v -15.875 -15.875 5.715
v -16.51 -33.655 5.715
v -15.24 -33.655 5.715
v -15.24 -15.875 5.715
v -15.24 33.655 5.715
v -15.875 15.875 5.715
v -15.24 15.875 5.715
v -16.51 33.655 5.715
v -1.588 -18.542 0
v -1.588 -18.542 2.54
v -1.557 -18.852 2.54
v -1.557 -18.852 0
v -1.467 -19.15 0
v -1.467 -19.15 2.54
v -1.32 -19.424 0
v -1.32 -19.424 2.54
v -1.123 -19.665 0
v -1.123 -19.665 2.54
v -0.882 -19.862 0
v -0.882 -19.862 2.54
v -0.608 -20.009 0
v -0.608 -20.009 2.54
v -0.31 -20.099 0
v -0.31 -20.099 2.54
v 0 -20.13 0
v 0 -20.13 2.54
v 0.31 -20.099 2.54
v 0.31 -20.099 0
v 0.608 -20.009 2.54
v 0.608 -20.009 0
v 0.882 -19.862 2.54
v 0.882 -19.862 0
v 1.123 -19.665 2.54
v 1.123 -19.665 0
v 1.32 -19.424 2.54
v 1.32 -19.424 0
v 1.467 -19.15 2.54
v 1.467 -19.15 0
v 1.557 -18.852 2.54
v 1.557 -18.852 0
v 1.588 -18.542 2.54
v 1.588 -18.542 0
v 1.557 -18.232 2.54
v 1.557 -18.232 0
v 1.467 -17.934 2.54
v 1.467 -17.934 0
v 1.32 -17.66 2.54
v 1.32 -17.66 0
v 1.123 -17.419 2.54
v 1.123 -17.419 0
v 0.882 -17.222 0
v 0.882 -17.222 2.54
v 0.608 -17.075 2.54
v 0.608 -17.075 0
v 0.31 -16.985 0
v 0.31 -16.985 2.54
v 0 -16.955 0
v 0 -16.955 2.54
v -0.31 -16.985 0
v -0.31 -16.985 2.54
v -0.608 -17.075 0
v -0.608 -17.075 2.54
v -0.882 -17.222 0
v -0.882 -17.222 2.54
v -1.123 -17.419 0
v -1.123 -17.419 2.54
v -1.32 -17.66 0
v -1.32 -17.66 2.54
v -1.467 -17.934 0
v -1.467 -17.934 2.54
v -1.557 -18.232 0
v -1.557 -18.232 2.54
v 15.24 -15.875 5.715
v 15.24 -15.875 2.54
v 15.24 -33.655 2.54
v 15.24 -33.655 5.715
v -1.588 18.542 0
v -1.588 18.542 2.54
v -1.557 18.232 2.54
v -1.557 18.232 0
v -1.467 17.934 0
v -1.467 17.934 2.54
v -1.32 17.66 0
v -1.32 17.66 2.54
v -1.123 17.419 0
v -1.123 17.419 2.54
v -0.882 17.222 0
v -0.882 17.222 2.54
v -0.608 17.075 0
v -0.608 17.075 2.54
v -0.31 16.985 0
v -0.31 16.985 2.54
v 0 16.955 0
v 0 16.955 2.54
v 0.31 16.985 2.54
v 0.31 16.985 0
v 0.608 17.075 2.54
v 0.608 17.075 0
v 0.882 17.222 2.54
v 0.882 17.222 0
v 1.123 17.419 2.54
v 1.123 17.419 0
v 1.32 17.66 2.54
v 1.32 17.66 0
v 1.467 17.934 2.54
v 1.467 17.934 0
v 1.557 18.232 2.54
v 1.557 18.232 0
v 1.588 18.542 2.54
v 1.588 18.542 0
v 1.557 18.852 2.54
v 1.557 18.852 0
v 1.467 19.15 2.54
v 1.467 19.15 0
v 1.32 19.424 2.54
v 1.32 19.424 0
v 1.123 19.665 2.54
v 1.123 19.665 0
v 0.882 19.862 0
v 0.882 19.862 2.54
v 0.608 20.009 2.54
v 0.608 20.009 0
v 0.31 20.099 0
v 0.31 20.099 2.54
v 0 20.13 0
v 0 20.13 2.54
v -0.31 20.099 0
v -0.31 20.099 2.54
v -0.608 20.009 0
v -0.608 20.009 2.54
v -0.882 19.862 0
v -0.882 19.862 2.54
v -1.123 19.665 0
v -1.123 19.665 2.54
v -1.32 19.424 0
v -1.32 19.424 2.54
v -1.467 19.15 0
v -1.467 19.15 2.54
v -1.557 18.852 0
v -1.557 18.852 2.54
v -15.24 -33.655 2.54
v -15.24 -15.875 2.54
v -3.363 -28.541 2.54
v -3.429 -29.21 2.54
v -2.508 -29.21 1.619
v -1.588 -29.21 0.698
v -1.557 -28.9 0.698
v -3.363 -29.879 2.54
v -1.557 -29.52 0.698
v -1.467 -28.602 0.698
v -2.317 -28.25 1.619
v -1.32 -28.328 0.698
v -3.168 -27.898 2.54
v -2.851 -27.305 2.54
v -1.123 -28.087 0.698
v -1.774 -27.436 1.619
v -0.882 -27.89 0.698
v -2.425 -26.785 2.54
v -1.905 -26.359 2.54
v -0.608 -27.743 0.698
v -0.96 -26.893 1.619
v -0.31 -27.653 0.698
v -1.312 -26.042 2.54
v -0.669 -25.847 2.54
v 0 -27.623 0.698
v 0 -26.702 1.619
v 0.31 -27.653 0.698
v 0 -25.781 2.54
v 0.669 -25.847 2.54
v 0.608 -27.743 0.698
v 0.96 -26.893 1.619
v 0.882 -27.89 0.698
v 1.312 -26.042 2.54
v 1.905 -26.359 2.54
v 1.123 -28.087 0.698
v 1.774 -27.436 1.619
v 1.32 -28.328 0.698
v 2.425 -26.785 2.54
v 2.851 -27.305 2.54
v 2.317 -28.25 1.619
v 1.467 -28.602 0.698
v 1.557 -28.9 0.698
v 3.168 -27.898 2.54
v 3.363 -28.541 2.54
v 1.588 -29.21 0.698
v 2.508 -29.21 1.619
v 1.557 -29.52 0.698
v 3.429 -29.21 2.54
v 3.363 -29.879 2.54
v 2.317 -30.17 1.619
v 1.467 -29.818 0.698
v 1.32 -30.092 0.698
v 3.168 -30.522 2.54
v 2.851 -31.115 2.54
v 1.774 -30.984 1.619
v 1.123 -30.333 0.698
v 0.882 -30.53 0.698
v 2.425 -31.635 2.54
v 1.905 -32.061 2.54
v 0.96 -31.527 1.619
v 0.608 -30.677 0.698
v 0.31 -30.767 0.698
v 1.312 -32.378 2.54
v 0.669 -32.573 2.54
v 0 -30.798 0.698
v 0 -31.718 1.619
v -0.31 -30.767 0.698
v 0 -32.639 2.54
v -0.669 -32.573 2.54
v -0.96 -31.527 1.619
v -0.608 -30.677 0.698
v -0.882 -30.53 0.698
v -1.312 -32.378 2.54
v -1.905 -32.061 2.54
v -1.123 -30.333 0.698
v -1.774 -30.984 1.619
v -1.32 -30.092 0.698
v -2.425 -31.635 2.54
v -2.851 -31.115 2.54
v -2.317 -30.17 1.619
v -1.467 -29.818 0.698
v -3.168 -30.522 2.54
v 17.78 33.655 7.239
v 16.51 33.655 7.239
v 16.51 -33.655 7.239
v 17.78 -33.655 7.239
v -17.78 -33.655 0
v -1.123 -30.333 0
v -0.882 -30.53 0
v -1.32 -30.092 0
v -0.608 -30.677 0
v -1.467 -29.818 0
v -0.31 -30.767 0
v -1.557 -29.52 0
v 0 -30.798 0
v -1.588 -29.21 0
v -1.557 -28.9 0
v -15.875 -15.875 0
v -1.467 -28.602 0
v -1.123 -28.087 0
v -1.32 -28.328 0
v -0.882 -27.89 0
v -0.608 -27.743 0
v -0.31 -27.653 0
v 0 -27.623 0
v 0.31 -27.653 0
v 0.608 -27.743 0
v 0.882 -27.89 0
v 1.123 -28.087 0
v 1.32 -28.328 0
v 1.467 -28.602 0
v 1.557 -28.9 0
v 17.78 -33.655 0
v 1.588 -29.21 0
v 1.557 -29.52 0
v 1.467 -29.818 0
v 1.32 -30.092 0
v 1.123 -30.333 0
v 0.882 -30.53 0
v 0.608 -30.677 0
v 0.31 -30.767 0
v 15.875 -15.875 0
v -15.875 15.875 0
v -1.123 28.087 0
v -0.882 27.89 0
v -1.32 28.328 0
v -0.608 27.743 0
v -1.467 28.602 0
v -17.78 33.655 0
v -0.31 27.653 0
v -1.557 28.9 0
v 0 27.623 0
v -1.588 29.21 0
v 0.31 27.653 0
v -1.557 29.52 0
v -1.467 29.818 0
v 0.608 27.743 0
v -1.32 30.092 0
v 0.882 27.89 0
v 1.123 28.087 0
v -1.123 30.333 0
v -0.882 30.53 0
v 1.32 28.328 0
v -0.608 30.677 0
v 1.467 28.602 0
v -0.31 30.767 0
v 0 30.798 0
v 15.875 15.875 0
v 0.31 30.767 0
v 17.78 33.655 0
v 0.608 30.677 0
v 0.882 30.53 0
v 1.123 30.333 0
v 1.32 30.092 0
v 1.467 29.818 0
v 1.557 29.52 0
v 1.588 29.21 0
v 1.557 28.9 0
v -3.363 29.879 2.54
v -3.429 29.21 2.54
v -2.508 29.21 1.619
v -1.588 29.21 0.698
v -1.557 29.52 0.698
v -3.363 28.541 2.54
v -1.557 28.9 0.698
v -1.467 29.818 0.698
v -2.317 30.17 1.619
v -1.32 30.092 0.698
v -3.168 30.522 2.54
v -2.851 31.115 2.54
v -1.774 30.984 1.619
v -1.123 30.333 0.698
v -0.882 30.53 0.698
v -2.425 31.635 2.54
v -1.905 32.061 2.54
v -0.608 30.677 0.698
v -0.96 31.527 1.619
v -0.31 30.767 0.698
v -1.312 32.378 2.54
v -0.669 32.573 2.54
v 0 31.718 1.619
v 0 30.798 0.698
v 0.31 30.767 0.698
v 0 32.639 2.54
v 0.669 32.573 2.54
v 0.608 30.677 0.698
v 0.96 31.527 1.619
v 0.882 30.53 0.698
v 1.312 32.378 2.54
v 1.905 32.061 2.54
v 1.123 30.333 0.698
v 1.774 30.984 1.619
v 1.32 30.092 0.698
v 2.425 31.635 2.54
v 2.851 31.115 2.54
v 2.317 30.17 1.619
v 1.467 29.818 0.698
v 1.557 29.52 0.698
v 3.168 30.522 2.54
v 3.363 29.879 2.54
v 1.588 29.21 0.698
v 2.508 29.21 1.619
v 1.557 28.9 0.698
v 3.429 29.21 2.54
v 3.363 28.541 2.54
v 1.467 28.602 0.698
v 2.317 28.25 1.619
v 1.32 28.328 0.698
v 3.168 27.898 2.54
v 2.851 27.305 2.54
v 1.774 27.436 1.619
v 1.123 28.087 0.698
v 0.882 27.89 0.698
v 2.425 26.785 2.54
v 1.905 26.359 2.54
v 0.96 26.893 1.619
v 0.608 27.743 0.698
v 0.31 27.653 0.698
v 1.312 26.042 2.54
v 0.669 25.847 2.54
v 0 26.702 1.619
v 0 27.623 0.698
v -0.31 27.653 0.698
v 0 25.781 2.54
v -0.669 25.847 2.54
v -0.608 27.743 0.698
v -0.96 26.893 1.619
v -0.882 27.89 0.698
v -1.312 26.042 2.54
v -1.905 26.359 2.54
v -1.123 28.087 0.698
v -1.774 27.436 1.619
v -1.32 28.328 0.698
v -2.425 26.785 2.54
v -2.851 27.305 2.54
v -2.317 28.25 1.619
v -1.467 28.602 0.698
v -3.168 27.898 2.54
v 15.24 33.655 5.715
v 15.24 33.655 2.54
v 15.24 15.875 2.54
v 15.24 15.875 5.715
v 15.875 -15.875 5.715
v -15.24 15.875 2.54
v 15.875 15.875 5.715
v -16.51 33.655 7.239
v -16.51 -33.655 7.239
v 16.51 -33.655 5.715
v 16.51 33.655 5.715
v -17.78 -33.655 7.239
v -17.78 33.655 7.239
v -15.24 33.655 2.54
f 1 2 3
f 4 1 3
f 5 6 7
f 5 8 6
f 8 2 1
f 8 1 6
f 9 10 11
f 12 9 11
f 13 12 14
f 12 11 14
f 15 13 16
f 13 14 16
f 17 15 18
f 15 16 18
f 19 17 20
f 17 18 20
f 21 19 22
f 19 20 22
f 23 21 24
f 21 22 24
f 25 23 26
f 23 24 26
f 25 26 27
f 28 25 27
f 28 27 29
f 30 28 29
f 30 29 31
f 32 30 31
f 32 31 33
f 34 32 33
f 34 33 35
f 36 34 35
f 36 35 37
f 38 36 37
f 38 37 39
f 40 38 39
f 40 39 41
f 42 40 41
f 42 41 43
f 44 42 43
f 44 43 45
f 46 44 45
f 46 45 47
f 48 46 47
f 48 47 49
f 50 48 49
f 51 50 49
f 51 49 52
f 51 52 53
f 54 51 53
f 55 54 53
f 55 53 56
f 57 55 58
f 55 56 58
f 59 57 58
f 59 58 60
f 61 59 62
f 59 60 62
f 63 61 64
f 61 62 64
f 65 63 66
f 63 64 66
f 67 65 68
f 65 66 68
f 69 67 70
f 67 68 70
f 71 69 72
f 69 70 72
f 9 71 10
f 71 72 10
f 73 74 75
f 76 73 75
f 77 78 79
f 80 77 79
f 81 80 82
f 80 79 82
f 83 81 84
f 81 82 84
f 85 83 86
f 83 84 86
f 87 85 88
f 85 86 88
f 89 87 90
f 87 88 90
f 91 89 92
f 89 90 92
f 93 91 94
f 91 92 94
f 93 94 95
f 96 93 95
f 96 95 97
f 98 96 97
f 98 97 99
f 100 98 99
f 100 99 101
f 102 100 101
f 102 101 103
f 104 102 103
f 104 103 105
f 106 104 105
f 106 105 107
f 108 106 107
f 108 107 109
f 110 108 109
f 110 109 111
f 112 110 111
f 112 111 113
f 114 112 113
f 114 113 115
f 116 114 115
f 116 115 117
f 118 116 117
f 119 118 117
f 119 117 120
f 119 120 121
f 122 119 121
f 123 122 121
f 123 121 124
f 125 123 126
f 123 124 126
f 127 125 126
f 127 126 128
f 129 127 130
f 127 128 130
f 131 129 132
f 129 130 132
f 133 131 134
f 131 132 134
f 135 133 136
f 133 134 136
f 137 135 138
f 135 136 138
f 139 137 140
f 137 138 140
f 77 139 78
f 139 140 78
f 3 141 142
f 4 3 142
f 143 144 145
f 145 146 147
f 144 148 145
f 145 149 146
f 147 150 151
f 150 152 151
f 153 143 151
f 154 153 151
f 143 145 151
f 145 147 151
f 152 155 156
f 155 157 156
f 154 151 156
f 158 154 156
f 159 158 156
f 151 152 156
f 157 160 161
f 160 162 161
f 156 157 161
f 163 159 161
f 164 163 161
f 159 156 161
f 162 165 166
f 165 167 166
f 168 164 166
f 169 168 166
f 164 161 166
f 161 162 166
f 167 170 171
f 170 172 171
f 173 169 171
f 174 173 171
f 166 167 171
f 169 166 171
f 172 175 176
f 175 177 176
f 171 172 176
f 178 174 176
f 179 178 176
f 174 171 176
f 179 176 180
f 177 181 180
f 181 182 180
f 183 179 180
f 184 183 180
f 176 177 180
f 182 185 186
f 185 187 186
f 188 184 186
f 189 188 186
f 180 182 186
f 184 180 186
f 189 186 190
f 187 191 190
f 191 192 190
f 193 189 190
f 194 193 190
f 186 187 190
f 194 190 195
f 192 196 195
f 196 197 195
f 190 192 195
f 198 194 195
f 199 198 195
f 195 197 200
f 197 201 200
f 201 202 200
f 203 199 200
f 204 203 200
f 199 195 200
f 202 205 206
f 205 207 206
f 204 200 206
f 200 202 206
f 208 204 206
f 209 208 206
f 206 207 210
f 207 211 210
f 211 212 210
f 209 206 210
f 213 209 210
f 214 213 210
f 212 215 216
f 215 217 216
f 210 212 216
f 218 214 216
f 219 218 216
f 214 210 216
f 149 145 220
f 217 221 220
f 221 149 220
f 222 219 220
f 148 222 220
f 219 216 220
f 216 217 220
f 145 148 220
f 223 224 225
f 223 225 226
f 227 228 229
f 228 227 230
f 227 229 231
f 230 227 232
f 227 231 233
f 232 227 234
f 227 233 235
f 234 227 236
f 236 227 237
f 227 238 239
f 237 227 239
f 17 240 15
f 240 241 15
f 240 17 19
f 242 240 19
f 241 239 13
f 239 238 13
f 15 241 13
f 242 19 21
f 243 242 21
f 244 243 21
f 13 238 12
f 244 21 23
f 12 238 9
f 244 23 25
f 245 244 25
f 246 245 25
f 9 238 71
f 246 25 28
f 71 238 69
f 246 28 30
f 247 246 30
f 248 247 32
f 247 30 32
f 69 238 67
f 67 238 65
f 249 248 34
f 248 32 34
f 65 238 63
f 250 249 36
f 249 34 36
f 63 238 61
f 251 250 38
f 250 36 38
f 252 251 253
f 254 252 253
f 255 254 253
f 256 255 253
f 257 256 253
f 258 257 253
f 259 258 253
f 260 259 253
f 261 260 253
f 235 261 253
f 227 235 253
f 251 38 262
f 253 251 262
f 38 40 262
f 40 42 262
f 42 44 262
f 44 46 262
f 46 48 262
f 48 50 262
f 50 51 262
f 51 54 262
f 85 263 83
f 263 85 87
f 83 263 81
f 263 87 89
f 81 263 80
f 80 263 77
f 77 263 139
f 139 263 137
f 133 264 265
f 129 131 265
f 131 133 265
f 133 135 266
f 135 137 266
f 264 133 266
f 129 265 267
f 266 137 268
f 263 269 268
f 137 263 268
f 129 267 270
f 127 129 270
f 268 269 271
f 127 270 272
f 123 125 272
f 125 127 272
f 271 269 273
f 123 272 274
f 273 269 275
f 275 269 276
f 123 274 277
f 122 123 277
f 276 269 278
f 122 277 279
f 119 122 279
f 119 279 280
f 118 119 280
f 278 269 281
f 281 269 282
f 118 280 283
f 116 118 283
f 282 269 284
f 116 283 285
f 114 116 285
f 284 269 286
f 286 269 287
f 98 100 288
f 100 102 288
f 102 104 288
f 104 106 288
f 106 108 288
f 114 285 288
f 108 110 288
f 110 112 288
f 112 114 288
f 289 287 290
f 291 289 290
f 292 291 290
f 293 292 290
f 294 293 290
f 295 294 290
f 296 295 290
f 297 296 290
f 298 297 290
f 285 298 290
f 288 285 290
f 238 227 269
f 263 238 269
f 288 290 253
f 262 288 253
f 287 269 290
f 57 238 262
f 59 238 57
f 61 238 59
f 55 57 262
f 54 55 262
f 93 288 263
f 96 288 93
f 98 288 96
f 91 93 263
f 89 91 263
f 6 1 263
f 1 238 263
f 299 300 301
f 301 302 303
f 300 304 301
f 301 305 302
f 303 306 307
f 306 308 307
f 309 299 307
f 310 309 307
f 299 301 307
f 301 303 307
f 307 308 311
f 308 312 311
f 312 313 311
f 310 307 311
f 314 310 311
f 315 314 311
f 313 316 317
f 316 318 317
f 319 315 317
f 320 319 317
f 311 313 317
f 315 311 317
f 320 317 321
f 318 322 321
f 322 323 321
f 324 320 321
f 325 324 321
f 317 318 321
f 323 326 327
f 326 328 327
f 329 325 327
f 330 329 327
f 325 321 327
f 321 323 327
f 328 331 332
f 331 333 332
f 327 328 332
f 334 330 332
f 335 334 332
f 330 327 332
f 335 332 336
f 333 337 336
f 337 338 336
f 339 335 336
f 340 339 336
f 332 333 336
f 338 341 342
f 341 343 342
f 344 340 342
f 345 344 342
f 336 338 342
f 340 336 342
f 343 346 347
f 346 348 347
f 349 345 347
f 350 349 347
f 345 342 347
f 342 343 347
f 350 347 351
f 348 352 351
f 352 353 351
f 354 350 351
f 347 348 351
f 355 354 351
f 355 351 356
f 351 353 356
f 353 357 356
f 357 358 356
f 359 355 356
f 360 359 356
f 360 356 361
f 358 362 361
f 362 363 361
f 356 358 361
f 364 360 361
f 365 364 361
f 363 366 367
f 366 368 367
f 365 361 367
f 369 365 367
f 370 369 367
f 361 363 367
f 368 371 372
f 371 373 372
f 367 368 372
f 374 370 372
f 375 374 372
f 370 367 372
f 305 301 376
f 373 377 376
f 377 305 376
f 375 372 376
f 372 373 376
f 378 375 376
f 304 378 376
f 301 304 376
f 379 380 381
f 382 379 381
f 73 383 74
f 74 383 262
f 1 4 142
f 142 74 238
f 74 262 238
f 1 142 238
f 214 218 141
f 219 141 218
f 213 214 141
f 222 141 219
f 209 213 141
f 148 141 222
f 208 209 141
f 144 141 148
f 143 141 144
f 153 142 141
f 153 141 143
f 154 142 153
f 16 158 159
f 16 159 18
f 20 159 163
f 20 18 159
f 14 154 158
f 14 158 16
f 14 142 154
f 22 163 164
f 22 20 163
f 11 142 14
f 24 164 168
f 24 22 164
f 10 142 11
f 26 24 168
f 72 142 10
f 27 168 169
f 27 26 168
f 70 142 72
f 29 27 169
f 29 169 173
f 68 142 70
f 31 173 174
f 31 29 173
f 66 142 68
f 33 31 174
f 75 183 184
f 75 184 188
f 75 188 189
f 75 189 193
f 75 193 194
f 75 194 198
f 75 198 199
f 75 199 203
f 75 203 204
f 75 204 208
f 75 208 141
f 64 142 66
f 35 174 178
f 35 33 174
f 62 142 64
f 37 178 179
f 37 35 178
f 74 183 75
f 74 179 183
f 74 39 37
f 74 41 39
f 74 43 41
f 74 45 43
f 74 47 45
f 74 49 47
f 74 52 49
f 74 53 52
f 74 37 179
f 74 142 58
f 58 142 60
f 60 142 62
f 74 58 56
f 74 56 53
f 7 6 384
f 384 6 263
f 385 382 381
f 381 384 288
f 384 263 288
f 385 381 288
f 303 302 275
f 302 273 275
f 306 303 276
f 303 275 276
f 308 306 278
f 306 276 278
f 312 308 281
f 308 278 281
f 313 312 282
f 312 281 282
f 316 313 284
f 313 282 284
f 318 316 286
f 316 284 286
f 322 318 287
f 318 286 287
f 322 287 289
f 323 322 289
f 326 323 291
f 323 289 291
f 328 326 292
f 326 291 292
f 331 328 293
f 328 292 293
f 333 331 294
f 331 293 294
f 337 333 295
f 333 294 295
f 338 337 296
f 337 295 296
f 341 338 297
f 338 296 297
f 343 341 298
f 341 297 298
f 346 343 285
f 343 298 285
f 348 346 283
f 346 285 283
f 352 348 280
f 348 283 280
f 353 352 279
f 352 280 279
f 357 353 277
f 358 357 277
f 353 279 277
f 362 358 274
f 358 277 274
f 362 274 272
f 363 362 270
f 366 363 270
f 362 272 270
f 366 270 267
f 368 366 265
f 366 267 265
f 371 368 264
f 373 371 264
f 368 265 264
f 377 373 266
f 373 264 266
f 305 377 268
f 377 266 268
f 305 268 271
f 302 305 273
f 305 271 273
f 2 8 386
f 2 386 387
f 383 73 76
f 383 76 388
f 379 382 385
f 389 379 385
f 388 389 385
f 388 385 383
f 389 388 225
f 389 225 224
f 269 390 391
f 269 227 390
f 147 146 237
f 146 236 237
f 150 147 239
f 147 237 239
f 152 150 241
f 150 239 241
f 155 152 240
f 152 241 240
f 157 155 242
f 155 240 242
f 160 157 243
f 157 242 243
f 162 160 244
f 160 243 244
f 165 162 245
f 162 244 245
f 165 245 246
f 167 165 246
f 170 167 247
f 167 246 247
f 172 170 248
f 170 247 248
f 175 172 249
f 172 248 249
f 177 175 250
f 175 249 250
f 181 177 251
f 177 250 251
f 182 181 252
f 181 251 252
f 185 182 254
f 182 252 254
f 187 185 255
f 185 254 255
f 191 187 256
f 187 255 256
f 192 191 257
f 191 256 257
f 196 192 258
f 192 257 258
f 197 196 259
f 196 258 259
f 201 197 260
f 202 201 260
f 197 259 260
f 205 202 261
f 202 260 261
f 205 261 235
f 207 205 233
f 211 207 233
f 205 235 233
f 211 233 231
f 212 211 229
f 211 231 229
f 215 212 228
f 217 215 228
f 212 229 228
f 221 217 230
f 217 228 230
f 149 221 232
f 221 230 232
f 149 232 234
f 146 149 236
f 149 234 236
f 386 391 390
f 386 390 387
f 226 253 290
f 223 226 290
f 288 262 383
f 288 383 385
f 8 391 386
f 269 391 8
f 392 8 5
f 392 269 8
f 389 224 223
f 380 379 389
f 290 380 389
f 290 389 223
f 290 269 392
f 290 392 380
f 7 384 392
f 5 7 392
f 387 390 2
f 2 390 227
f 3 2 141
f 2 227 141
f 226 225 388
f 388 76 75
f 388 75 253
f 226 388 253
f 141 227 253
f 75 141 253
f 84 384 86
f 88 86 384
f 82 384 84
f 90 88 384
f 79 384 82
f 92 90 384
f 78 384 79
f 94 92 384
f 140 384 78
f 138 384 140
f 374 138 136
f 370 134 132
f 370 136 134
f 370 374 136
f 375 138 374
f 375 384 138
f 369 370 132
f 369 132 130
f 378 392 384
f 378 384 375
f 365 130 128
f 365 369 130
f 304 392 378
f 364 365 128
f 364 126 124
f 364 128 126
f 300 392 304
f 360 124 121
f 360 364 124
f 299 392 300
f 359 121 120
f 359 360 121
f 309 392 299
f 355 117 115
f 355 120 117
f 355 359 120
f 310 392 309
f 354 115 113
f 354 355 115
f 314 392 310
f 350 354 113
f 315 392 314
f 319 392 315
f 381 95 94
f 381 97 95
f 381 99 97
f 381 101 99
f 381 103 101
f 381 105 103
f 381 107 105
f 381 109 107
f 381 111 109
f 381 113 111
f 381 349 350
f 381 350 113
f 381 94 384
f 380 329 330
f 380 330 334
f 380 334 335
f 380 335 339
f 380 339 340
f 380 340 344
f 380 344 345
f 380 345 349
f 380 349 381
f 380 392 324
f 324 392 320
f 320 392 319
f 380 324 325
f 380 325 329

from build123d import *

# Parameters (mm, degrees)
F0_W           = 35.56
F0_H           = 67.31
F0_W_2         = 31.75
F0_H_2         = 31.75
F1_DEPTH       = 2.54
F3_D           = 3.175
F3_CSINK_D     = 6.858
F3_CSINK_ANGLE = 90
F4_D           = 3.175
F6_DEPTH       = 3.175
F7_DEPTH       = 4.699


with BuildPart() as f1:
    # F0 (on Top) → F1 (new body)
    with BuildSketch(Plane.XY):
        Rectangle(F0_W, F0_H)
        Rectangle(F0_W_2, F0_H_2, mode=Mode.SUBTRACT)
    extrude(amount=F1_DEPTH)

    # F3 (through all)
    with Locations(Plane.XY.offset(2.54)):
        with Locations((0, 29.21), (0, -29.21)):
            CounterSinkHole(F3_D / 2, F3_CSINK_D / 2, counter_sink_angle=F3_CSINK_ANGLE)

    # F4 (through all)
    with Locations(Plane(origin=(0, 0, 0), x_dir=(1, 0, 0), z_dir=(0, 0, -1))):
        with Locations((0, -18.542), (0, 18.542)):
            Hole(F4_D / 2)

    # F5 (on face) → F6 (join)
    with BuildSketch(Plane.XY.offset(2.54)):
        Polygon((-15.24, 33.655), (-16.51, 33.655), (-16.51, -33.655), (-15.24, -33.655), (-15.24, -15.875), (-15.875, -15.875), (-15.875, 15.875), (-15.24, 15.875), align=None)
        Polygon((16.51, 33.655), (15.24, 33.655), (15.24, 15.875), (15.875, 15.875), (15.875, -15.875), (15.24, -15.875), (15.24, -33.655), (16.51, -33.655), align=None)
    extrude(amount=F6_DEPTH)

    # F7 (add): faces of the model
    f7_faces = [f1.faces().sort_by_distance(p)[0] for p in [
        (-17.145, 0, 2.54),
        (17.145, 0, 2.54),
    ]]
    extrude(f7_faces, amount=F7_DEPTH)


solid = f1.part
